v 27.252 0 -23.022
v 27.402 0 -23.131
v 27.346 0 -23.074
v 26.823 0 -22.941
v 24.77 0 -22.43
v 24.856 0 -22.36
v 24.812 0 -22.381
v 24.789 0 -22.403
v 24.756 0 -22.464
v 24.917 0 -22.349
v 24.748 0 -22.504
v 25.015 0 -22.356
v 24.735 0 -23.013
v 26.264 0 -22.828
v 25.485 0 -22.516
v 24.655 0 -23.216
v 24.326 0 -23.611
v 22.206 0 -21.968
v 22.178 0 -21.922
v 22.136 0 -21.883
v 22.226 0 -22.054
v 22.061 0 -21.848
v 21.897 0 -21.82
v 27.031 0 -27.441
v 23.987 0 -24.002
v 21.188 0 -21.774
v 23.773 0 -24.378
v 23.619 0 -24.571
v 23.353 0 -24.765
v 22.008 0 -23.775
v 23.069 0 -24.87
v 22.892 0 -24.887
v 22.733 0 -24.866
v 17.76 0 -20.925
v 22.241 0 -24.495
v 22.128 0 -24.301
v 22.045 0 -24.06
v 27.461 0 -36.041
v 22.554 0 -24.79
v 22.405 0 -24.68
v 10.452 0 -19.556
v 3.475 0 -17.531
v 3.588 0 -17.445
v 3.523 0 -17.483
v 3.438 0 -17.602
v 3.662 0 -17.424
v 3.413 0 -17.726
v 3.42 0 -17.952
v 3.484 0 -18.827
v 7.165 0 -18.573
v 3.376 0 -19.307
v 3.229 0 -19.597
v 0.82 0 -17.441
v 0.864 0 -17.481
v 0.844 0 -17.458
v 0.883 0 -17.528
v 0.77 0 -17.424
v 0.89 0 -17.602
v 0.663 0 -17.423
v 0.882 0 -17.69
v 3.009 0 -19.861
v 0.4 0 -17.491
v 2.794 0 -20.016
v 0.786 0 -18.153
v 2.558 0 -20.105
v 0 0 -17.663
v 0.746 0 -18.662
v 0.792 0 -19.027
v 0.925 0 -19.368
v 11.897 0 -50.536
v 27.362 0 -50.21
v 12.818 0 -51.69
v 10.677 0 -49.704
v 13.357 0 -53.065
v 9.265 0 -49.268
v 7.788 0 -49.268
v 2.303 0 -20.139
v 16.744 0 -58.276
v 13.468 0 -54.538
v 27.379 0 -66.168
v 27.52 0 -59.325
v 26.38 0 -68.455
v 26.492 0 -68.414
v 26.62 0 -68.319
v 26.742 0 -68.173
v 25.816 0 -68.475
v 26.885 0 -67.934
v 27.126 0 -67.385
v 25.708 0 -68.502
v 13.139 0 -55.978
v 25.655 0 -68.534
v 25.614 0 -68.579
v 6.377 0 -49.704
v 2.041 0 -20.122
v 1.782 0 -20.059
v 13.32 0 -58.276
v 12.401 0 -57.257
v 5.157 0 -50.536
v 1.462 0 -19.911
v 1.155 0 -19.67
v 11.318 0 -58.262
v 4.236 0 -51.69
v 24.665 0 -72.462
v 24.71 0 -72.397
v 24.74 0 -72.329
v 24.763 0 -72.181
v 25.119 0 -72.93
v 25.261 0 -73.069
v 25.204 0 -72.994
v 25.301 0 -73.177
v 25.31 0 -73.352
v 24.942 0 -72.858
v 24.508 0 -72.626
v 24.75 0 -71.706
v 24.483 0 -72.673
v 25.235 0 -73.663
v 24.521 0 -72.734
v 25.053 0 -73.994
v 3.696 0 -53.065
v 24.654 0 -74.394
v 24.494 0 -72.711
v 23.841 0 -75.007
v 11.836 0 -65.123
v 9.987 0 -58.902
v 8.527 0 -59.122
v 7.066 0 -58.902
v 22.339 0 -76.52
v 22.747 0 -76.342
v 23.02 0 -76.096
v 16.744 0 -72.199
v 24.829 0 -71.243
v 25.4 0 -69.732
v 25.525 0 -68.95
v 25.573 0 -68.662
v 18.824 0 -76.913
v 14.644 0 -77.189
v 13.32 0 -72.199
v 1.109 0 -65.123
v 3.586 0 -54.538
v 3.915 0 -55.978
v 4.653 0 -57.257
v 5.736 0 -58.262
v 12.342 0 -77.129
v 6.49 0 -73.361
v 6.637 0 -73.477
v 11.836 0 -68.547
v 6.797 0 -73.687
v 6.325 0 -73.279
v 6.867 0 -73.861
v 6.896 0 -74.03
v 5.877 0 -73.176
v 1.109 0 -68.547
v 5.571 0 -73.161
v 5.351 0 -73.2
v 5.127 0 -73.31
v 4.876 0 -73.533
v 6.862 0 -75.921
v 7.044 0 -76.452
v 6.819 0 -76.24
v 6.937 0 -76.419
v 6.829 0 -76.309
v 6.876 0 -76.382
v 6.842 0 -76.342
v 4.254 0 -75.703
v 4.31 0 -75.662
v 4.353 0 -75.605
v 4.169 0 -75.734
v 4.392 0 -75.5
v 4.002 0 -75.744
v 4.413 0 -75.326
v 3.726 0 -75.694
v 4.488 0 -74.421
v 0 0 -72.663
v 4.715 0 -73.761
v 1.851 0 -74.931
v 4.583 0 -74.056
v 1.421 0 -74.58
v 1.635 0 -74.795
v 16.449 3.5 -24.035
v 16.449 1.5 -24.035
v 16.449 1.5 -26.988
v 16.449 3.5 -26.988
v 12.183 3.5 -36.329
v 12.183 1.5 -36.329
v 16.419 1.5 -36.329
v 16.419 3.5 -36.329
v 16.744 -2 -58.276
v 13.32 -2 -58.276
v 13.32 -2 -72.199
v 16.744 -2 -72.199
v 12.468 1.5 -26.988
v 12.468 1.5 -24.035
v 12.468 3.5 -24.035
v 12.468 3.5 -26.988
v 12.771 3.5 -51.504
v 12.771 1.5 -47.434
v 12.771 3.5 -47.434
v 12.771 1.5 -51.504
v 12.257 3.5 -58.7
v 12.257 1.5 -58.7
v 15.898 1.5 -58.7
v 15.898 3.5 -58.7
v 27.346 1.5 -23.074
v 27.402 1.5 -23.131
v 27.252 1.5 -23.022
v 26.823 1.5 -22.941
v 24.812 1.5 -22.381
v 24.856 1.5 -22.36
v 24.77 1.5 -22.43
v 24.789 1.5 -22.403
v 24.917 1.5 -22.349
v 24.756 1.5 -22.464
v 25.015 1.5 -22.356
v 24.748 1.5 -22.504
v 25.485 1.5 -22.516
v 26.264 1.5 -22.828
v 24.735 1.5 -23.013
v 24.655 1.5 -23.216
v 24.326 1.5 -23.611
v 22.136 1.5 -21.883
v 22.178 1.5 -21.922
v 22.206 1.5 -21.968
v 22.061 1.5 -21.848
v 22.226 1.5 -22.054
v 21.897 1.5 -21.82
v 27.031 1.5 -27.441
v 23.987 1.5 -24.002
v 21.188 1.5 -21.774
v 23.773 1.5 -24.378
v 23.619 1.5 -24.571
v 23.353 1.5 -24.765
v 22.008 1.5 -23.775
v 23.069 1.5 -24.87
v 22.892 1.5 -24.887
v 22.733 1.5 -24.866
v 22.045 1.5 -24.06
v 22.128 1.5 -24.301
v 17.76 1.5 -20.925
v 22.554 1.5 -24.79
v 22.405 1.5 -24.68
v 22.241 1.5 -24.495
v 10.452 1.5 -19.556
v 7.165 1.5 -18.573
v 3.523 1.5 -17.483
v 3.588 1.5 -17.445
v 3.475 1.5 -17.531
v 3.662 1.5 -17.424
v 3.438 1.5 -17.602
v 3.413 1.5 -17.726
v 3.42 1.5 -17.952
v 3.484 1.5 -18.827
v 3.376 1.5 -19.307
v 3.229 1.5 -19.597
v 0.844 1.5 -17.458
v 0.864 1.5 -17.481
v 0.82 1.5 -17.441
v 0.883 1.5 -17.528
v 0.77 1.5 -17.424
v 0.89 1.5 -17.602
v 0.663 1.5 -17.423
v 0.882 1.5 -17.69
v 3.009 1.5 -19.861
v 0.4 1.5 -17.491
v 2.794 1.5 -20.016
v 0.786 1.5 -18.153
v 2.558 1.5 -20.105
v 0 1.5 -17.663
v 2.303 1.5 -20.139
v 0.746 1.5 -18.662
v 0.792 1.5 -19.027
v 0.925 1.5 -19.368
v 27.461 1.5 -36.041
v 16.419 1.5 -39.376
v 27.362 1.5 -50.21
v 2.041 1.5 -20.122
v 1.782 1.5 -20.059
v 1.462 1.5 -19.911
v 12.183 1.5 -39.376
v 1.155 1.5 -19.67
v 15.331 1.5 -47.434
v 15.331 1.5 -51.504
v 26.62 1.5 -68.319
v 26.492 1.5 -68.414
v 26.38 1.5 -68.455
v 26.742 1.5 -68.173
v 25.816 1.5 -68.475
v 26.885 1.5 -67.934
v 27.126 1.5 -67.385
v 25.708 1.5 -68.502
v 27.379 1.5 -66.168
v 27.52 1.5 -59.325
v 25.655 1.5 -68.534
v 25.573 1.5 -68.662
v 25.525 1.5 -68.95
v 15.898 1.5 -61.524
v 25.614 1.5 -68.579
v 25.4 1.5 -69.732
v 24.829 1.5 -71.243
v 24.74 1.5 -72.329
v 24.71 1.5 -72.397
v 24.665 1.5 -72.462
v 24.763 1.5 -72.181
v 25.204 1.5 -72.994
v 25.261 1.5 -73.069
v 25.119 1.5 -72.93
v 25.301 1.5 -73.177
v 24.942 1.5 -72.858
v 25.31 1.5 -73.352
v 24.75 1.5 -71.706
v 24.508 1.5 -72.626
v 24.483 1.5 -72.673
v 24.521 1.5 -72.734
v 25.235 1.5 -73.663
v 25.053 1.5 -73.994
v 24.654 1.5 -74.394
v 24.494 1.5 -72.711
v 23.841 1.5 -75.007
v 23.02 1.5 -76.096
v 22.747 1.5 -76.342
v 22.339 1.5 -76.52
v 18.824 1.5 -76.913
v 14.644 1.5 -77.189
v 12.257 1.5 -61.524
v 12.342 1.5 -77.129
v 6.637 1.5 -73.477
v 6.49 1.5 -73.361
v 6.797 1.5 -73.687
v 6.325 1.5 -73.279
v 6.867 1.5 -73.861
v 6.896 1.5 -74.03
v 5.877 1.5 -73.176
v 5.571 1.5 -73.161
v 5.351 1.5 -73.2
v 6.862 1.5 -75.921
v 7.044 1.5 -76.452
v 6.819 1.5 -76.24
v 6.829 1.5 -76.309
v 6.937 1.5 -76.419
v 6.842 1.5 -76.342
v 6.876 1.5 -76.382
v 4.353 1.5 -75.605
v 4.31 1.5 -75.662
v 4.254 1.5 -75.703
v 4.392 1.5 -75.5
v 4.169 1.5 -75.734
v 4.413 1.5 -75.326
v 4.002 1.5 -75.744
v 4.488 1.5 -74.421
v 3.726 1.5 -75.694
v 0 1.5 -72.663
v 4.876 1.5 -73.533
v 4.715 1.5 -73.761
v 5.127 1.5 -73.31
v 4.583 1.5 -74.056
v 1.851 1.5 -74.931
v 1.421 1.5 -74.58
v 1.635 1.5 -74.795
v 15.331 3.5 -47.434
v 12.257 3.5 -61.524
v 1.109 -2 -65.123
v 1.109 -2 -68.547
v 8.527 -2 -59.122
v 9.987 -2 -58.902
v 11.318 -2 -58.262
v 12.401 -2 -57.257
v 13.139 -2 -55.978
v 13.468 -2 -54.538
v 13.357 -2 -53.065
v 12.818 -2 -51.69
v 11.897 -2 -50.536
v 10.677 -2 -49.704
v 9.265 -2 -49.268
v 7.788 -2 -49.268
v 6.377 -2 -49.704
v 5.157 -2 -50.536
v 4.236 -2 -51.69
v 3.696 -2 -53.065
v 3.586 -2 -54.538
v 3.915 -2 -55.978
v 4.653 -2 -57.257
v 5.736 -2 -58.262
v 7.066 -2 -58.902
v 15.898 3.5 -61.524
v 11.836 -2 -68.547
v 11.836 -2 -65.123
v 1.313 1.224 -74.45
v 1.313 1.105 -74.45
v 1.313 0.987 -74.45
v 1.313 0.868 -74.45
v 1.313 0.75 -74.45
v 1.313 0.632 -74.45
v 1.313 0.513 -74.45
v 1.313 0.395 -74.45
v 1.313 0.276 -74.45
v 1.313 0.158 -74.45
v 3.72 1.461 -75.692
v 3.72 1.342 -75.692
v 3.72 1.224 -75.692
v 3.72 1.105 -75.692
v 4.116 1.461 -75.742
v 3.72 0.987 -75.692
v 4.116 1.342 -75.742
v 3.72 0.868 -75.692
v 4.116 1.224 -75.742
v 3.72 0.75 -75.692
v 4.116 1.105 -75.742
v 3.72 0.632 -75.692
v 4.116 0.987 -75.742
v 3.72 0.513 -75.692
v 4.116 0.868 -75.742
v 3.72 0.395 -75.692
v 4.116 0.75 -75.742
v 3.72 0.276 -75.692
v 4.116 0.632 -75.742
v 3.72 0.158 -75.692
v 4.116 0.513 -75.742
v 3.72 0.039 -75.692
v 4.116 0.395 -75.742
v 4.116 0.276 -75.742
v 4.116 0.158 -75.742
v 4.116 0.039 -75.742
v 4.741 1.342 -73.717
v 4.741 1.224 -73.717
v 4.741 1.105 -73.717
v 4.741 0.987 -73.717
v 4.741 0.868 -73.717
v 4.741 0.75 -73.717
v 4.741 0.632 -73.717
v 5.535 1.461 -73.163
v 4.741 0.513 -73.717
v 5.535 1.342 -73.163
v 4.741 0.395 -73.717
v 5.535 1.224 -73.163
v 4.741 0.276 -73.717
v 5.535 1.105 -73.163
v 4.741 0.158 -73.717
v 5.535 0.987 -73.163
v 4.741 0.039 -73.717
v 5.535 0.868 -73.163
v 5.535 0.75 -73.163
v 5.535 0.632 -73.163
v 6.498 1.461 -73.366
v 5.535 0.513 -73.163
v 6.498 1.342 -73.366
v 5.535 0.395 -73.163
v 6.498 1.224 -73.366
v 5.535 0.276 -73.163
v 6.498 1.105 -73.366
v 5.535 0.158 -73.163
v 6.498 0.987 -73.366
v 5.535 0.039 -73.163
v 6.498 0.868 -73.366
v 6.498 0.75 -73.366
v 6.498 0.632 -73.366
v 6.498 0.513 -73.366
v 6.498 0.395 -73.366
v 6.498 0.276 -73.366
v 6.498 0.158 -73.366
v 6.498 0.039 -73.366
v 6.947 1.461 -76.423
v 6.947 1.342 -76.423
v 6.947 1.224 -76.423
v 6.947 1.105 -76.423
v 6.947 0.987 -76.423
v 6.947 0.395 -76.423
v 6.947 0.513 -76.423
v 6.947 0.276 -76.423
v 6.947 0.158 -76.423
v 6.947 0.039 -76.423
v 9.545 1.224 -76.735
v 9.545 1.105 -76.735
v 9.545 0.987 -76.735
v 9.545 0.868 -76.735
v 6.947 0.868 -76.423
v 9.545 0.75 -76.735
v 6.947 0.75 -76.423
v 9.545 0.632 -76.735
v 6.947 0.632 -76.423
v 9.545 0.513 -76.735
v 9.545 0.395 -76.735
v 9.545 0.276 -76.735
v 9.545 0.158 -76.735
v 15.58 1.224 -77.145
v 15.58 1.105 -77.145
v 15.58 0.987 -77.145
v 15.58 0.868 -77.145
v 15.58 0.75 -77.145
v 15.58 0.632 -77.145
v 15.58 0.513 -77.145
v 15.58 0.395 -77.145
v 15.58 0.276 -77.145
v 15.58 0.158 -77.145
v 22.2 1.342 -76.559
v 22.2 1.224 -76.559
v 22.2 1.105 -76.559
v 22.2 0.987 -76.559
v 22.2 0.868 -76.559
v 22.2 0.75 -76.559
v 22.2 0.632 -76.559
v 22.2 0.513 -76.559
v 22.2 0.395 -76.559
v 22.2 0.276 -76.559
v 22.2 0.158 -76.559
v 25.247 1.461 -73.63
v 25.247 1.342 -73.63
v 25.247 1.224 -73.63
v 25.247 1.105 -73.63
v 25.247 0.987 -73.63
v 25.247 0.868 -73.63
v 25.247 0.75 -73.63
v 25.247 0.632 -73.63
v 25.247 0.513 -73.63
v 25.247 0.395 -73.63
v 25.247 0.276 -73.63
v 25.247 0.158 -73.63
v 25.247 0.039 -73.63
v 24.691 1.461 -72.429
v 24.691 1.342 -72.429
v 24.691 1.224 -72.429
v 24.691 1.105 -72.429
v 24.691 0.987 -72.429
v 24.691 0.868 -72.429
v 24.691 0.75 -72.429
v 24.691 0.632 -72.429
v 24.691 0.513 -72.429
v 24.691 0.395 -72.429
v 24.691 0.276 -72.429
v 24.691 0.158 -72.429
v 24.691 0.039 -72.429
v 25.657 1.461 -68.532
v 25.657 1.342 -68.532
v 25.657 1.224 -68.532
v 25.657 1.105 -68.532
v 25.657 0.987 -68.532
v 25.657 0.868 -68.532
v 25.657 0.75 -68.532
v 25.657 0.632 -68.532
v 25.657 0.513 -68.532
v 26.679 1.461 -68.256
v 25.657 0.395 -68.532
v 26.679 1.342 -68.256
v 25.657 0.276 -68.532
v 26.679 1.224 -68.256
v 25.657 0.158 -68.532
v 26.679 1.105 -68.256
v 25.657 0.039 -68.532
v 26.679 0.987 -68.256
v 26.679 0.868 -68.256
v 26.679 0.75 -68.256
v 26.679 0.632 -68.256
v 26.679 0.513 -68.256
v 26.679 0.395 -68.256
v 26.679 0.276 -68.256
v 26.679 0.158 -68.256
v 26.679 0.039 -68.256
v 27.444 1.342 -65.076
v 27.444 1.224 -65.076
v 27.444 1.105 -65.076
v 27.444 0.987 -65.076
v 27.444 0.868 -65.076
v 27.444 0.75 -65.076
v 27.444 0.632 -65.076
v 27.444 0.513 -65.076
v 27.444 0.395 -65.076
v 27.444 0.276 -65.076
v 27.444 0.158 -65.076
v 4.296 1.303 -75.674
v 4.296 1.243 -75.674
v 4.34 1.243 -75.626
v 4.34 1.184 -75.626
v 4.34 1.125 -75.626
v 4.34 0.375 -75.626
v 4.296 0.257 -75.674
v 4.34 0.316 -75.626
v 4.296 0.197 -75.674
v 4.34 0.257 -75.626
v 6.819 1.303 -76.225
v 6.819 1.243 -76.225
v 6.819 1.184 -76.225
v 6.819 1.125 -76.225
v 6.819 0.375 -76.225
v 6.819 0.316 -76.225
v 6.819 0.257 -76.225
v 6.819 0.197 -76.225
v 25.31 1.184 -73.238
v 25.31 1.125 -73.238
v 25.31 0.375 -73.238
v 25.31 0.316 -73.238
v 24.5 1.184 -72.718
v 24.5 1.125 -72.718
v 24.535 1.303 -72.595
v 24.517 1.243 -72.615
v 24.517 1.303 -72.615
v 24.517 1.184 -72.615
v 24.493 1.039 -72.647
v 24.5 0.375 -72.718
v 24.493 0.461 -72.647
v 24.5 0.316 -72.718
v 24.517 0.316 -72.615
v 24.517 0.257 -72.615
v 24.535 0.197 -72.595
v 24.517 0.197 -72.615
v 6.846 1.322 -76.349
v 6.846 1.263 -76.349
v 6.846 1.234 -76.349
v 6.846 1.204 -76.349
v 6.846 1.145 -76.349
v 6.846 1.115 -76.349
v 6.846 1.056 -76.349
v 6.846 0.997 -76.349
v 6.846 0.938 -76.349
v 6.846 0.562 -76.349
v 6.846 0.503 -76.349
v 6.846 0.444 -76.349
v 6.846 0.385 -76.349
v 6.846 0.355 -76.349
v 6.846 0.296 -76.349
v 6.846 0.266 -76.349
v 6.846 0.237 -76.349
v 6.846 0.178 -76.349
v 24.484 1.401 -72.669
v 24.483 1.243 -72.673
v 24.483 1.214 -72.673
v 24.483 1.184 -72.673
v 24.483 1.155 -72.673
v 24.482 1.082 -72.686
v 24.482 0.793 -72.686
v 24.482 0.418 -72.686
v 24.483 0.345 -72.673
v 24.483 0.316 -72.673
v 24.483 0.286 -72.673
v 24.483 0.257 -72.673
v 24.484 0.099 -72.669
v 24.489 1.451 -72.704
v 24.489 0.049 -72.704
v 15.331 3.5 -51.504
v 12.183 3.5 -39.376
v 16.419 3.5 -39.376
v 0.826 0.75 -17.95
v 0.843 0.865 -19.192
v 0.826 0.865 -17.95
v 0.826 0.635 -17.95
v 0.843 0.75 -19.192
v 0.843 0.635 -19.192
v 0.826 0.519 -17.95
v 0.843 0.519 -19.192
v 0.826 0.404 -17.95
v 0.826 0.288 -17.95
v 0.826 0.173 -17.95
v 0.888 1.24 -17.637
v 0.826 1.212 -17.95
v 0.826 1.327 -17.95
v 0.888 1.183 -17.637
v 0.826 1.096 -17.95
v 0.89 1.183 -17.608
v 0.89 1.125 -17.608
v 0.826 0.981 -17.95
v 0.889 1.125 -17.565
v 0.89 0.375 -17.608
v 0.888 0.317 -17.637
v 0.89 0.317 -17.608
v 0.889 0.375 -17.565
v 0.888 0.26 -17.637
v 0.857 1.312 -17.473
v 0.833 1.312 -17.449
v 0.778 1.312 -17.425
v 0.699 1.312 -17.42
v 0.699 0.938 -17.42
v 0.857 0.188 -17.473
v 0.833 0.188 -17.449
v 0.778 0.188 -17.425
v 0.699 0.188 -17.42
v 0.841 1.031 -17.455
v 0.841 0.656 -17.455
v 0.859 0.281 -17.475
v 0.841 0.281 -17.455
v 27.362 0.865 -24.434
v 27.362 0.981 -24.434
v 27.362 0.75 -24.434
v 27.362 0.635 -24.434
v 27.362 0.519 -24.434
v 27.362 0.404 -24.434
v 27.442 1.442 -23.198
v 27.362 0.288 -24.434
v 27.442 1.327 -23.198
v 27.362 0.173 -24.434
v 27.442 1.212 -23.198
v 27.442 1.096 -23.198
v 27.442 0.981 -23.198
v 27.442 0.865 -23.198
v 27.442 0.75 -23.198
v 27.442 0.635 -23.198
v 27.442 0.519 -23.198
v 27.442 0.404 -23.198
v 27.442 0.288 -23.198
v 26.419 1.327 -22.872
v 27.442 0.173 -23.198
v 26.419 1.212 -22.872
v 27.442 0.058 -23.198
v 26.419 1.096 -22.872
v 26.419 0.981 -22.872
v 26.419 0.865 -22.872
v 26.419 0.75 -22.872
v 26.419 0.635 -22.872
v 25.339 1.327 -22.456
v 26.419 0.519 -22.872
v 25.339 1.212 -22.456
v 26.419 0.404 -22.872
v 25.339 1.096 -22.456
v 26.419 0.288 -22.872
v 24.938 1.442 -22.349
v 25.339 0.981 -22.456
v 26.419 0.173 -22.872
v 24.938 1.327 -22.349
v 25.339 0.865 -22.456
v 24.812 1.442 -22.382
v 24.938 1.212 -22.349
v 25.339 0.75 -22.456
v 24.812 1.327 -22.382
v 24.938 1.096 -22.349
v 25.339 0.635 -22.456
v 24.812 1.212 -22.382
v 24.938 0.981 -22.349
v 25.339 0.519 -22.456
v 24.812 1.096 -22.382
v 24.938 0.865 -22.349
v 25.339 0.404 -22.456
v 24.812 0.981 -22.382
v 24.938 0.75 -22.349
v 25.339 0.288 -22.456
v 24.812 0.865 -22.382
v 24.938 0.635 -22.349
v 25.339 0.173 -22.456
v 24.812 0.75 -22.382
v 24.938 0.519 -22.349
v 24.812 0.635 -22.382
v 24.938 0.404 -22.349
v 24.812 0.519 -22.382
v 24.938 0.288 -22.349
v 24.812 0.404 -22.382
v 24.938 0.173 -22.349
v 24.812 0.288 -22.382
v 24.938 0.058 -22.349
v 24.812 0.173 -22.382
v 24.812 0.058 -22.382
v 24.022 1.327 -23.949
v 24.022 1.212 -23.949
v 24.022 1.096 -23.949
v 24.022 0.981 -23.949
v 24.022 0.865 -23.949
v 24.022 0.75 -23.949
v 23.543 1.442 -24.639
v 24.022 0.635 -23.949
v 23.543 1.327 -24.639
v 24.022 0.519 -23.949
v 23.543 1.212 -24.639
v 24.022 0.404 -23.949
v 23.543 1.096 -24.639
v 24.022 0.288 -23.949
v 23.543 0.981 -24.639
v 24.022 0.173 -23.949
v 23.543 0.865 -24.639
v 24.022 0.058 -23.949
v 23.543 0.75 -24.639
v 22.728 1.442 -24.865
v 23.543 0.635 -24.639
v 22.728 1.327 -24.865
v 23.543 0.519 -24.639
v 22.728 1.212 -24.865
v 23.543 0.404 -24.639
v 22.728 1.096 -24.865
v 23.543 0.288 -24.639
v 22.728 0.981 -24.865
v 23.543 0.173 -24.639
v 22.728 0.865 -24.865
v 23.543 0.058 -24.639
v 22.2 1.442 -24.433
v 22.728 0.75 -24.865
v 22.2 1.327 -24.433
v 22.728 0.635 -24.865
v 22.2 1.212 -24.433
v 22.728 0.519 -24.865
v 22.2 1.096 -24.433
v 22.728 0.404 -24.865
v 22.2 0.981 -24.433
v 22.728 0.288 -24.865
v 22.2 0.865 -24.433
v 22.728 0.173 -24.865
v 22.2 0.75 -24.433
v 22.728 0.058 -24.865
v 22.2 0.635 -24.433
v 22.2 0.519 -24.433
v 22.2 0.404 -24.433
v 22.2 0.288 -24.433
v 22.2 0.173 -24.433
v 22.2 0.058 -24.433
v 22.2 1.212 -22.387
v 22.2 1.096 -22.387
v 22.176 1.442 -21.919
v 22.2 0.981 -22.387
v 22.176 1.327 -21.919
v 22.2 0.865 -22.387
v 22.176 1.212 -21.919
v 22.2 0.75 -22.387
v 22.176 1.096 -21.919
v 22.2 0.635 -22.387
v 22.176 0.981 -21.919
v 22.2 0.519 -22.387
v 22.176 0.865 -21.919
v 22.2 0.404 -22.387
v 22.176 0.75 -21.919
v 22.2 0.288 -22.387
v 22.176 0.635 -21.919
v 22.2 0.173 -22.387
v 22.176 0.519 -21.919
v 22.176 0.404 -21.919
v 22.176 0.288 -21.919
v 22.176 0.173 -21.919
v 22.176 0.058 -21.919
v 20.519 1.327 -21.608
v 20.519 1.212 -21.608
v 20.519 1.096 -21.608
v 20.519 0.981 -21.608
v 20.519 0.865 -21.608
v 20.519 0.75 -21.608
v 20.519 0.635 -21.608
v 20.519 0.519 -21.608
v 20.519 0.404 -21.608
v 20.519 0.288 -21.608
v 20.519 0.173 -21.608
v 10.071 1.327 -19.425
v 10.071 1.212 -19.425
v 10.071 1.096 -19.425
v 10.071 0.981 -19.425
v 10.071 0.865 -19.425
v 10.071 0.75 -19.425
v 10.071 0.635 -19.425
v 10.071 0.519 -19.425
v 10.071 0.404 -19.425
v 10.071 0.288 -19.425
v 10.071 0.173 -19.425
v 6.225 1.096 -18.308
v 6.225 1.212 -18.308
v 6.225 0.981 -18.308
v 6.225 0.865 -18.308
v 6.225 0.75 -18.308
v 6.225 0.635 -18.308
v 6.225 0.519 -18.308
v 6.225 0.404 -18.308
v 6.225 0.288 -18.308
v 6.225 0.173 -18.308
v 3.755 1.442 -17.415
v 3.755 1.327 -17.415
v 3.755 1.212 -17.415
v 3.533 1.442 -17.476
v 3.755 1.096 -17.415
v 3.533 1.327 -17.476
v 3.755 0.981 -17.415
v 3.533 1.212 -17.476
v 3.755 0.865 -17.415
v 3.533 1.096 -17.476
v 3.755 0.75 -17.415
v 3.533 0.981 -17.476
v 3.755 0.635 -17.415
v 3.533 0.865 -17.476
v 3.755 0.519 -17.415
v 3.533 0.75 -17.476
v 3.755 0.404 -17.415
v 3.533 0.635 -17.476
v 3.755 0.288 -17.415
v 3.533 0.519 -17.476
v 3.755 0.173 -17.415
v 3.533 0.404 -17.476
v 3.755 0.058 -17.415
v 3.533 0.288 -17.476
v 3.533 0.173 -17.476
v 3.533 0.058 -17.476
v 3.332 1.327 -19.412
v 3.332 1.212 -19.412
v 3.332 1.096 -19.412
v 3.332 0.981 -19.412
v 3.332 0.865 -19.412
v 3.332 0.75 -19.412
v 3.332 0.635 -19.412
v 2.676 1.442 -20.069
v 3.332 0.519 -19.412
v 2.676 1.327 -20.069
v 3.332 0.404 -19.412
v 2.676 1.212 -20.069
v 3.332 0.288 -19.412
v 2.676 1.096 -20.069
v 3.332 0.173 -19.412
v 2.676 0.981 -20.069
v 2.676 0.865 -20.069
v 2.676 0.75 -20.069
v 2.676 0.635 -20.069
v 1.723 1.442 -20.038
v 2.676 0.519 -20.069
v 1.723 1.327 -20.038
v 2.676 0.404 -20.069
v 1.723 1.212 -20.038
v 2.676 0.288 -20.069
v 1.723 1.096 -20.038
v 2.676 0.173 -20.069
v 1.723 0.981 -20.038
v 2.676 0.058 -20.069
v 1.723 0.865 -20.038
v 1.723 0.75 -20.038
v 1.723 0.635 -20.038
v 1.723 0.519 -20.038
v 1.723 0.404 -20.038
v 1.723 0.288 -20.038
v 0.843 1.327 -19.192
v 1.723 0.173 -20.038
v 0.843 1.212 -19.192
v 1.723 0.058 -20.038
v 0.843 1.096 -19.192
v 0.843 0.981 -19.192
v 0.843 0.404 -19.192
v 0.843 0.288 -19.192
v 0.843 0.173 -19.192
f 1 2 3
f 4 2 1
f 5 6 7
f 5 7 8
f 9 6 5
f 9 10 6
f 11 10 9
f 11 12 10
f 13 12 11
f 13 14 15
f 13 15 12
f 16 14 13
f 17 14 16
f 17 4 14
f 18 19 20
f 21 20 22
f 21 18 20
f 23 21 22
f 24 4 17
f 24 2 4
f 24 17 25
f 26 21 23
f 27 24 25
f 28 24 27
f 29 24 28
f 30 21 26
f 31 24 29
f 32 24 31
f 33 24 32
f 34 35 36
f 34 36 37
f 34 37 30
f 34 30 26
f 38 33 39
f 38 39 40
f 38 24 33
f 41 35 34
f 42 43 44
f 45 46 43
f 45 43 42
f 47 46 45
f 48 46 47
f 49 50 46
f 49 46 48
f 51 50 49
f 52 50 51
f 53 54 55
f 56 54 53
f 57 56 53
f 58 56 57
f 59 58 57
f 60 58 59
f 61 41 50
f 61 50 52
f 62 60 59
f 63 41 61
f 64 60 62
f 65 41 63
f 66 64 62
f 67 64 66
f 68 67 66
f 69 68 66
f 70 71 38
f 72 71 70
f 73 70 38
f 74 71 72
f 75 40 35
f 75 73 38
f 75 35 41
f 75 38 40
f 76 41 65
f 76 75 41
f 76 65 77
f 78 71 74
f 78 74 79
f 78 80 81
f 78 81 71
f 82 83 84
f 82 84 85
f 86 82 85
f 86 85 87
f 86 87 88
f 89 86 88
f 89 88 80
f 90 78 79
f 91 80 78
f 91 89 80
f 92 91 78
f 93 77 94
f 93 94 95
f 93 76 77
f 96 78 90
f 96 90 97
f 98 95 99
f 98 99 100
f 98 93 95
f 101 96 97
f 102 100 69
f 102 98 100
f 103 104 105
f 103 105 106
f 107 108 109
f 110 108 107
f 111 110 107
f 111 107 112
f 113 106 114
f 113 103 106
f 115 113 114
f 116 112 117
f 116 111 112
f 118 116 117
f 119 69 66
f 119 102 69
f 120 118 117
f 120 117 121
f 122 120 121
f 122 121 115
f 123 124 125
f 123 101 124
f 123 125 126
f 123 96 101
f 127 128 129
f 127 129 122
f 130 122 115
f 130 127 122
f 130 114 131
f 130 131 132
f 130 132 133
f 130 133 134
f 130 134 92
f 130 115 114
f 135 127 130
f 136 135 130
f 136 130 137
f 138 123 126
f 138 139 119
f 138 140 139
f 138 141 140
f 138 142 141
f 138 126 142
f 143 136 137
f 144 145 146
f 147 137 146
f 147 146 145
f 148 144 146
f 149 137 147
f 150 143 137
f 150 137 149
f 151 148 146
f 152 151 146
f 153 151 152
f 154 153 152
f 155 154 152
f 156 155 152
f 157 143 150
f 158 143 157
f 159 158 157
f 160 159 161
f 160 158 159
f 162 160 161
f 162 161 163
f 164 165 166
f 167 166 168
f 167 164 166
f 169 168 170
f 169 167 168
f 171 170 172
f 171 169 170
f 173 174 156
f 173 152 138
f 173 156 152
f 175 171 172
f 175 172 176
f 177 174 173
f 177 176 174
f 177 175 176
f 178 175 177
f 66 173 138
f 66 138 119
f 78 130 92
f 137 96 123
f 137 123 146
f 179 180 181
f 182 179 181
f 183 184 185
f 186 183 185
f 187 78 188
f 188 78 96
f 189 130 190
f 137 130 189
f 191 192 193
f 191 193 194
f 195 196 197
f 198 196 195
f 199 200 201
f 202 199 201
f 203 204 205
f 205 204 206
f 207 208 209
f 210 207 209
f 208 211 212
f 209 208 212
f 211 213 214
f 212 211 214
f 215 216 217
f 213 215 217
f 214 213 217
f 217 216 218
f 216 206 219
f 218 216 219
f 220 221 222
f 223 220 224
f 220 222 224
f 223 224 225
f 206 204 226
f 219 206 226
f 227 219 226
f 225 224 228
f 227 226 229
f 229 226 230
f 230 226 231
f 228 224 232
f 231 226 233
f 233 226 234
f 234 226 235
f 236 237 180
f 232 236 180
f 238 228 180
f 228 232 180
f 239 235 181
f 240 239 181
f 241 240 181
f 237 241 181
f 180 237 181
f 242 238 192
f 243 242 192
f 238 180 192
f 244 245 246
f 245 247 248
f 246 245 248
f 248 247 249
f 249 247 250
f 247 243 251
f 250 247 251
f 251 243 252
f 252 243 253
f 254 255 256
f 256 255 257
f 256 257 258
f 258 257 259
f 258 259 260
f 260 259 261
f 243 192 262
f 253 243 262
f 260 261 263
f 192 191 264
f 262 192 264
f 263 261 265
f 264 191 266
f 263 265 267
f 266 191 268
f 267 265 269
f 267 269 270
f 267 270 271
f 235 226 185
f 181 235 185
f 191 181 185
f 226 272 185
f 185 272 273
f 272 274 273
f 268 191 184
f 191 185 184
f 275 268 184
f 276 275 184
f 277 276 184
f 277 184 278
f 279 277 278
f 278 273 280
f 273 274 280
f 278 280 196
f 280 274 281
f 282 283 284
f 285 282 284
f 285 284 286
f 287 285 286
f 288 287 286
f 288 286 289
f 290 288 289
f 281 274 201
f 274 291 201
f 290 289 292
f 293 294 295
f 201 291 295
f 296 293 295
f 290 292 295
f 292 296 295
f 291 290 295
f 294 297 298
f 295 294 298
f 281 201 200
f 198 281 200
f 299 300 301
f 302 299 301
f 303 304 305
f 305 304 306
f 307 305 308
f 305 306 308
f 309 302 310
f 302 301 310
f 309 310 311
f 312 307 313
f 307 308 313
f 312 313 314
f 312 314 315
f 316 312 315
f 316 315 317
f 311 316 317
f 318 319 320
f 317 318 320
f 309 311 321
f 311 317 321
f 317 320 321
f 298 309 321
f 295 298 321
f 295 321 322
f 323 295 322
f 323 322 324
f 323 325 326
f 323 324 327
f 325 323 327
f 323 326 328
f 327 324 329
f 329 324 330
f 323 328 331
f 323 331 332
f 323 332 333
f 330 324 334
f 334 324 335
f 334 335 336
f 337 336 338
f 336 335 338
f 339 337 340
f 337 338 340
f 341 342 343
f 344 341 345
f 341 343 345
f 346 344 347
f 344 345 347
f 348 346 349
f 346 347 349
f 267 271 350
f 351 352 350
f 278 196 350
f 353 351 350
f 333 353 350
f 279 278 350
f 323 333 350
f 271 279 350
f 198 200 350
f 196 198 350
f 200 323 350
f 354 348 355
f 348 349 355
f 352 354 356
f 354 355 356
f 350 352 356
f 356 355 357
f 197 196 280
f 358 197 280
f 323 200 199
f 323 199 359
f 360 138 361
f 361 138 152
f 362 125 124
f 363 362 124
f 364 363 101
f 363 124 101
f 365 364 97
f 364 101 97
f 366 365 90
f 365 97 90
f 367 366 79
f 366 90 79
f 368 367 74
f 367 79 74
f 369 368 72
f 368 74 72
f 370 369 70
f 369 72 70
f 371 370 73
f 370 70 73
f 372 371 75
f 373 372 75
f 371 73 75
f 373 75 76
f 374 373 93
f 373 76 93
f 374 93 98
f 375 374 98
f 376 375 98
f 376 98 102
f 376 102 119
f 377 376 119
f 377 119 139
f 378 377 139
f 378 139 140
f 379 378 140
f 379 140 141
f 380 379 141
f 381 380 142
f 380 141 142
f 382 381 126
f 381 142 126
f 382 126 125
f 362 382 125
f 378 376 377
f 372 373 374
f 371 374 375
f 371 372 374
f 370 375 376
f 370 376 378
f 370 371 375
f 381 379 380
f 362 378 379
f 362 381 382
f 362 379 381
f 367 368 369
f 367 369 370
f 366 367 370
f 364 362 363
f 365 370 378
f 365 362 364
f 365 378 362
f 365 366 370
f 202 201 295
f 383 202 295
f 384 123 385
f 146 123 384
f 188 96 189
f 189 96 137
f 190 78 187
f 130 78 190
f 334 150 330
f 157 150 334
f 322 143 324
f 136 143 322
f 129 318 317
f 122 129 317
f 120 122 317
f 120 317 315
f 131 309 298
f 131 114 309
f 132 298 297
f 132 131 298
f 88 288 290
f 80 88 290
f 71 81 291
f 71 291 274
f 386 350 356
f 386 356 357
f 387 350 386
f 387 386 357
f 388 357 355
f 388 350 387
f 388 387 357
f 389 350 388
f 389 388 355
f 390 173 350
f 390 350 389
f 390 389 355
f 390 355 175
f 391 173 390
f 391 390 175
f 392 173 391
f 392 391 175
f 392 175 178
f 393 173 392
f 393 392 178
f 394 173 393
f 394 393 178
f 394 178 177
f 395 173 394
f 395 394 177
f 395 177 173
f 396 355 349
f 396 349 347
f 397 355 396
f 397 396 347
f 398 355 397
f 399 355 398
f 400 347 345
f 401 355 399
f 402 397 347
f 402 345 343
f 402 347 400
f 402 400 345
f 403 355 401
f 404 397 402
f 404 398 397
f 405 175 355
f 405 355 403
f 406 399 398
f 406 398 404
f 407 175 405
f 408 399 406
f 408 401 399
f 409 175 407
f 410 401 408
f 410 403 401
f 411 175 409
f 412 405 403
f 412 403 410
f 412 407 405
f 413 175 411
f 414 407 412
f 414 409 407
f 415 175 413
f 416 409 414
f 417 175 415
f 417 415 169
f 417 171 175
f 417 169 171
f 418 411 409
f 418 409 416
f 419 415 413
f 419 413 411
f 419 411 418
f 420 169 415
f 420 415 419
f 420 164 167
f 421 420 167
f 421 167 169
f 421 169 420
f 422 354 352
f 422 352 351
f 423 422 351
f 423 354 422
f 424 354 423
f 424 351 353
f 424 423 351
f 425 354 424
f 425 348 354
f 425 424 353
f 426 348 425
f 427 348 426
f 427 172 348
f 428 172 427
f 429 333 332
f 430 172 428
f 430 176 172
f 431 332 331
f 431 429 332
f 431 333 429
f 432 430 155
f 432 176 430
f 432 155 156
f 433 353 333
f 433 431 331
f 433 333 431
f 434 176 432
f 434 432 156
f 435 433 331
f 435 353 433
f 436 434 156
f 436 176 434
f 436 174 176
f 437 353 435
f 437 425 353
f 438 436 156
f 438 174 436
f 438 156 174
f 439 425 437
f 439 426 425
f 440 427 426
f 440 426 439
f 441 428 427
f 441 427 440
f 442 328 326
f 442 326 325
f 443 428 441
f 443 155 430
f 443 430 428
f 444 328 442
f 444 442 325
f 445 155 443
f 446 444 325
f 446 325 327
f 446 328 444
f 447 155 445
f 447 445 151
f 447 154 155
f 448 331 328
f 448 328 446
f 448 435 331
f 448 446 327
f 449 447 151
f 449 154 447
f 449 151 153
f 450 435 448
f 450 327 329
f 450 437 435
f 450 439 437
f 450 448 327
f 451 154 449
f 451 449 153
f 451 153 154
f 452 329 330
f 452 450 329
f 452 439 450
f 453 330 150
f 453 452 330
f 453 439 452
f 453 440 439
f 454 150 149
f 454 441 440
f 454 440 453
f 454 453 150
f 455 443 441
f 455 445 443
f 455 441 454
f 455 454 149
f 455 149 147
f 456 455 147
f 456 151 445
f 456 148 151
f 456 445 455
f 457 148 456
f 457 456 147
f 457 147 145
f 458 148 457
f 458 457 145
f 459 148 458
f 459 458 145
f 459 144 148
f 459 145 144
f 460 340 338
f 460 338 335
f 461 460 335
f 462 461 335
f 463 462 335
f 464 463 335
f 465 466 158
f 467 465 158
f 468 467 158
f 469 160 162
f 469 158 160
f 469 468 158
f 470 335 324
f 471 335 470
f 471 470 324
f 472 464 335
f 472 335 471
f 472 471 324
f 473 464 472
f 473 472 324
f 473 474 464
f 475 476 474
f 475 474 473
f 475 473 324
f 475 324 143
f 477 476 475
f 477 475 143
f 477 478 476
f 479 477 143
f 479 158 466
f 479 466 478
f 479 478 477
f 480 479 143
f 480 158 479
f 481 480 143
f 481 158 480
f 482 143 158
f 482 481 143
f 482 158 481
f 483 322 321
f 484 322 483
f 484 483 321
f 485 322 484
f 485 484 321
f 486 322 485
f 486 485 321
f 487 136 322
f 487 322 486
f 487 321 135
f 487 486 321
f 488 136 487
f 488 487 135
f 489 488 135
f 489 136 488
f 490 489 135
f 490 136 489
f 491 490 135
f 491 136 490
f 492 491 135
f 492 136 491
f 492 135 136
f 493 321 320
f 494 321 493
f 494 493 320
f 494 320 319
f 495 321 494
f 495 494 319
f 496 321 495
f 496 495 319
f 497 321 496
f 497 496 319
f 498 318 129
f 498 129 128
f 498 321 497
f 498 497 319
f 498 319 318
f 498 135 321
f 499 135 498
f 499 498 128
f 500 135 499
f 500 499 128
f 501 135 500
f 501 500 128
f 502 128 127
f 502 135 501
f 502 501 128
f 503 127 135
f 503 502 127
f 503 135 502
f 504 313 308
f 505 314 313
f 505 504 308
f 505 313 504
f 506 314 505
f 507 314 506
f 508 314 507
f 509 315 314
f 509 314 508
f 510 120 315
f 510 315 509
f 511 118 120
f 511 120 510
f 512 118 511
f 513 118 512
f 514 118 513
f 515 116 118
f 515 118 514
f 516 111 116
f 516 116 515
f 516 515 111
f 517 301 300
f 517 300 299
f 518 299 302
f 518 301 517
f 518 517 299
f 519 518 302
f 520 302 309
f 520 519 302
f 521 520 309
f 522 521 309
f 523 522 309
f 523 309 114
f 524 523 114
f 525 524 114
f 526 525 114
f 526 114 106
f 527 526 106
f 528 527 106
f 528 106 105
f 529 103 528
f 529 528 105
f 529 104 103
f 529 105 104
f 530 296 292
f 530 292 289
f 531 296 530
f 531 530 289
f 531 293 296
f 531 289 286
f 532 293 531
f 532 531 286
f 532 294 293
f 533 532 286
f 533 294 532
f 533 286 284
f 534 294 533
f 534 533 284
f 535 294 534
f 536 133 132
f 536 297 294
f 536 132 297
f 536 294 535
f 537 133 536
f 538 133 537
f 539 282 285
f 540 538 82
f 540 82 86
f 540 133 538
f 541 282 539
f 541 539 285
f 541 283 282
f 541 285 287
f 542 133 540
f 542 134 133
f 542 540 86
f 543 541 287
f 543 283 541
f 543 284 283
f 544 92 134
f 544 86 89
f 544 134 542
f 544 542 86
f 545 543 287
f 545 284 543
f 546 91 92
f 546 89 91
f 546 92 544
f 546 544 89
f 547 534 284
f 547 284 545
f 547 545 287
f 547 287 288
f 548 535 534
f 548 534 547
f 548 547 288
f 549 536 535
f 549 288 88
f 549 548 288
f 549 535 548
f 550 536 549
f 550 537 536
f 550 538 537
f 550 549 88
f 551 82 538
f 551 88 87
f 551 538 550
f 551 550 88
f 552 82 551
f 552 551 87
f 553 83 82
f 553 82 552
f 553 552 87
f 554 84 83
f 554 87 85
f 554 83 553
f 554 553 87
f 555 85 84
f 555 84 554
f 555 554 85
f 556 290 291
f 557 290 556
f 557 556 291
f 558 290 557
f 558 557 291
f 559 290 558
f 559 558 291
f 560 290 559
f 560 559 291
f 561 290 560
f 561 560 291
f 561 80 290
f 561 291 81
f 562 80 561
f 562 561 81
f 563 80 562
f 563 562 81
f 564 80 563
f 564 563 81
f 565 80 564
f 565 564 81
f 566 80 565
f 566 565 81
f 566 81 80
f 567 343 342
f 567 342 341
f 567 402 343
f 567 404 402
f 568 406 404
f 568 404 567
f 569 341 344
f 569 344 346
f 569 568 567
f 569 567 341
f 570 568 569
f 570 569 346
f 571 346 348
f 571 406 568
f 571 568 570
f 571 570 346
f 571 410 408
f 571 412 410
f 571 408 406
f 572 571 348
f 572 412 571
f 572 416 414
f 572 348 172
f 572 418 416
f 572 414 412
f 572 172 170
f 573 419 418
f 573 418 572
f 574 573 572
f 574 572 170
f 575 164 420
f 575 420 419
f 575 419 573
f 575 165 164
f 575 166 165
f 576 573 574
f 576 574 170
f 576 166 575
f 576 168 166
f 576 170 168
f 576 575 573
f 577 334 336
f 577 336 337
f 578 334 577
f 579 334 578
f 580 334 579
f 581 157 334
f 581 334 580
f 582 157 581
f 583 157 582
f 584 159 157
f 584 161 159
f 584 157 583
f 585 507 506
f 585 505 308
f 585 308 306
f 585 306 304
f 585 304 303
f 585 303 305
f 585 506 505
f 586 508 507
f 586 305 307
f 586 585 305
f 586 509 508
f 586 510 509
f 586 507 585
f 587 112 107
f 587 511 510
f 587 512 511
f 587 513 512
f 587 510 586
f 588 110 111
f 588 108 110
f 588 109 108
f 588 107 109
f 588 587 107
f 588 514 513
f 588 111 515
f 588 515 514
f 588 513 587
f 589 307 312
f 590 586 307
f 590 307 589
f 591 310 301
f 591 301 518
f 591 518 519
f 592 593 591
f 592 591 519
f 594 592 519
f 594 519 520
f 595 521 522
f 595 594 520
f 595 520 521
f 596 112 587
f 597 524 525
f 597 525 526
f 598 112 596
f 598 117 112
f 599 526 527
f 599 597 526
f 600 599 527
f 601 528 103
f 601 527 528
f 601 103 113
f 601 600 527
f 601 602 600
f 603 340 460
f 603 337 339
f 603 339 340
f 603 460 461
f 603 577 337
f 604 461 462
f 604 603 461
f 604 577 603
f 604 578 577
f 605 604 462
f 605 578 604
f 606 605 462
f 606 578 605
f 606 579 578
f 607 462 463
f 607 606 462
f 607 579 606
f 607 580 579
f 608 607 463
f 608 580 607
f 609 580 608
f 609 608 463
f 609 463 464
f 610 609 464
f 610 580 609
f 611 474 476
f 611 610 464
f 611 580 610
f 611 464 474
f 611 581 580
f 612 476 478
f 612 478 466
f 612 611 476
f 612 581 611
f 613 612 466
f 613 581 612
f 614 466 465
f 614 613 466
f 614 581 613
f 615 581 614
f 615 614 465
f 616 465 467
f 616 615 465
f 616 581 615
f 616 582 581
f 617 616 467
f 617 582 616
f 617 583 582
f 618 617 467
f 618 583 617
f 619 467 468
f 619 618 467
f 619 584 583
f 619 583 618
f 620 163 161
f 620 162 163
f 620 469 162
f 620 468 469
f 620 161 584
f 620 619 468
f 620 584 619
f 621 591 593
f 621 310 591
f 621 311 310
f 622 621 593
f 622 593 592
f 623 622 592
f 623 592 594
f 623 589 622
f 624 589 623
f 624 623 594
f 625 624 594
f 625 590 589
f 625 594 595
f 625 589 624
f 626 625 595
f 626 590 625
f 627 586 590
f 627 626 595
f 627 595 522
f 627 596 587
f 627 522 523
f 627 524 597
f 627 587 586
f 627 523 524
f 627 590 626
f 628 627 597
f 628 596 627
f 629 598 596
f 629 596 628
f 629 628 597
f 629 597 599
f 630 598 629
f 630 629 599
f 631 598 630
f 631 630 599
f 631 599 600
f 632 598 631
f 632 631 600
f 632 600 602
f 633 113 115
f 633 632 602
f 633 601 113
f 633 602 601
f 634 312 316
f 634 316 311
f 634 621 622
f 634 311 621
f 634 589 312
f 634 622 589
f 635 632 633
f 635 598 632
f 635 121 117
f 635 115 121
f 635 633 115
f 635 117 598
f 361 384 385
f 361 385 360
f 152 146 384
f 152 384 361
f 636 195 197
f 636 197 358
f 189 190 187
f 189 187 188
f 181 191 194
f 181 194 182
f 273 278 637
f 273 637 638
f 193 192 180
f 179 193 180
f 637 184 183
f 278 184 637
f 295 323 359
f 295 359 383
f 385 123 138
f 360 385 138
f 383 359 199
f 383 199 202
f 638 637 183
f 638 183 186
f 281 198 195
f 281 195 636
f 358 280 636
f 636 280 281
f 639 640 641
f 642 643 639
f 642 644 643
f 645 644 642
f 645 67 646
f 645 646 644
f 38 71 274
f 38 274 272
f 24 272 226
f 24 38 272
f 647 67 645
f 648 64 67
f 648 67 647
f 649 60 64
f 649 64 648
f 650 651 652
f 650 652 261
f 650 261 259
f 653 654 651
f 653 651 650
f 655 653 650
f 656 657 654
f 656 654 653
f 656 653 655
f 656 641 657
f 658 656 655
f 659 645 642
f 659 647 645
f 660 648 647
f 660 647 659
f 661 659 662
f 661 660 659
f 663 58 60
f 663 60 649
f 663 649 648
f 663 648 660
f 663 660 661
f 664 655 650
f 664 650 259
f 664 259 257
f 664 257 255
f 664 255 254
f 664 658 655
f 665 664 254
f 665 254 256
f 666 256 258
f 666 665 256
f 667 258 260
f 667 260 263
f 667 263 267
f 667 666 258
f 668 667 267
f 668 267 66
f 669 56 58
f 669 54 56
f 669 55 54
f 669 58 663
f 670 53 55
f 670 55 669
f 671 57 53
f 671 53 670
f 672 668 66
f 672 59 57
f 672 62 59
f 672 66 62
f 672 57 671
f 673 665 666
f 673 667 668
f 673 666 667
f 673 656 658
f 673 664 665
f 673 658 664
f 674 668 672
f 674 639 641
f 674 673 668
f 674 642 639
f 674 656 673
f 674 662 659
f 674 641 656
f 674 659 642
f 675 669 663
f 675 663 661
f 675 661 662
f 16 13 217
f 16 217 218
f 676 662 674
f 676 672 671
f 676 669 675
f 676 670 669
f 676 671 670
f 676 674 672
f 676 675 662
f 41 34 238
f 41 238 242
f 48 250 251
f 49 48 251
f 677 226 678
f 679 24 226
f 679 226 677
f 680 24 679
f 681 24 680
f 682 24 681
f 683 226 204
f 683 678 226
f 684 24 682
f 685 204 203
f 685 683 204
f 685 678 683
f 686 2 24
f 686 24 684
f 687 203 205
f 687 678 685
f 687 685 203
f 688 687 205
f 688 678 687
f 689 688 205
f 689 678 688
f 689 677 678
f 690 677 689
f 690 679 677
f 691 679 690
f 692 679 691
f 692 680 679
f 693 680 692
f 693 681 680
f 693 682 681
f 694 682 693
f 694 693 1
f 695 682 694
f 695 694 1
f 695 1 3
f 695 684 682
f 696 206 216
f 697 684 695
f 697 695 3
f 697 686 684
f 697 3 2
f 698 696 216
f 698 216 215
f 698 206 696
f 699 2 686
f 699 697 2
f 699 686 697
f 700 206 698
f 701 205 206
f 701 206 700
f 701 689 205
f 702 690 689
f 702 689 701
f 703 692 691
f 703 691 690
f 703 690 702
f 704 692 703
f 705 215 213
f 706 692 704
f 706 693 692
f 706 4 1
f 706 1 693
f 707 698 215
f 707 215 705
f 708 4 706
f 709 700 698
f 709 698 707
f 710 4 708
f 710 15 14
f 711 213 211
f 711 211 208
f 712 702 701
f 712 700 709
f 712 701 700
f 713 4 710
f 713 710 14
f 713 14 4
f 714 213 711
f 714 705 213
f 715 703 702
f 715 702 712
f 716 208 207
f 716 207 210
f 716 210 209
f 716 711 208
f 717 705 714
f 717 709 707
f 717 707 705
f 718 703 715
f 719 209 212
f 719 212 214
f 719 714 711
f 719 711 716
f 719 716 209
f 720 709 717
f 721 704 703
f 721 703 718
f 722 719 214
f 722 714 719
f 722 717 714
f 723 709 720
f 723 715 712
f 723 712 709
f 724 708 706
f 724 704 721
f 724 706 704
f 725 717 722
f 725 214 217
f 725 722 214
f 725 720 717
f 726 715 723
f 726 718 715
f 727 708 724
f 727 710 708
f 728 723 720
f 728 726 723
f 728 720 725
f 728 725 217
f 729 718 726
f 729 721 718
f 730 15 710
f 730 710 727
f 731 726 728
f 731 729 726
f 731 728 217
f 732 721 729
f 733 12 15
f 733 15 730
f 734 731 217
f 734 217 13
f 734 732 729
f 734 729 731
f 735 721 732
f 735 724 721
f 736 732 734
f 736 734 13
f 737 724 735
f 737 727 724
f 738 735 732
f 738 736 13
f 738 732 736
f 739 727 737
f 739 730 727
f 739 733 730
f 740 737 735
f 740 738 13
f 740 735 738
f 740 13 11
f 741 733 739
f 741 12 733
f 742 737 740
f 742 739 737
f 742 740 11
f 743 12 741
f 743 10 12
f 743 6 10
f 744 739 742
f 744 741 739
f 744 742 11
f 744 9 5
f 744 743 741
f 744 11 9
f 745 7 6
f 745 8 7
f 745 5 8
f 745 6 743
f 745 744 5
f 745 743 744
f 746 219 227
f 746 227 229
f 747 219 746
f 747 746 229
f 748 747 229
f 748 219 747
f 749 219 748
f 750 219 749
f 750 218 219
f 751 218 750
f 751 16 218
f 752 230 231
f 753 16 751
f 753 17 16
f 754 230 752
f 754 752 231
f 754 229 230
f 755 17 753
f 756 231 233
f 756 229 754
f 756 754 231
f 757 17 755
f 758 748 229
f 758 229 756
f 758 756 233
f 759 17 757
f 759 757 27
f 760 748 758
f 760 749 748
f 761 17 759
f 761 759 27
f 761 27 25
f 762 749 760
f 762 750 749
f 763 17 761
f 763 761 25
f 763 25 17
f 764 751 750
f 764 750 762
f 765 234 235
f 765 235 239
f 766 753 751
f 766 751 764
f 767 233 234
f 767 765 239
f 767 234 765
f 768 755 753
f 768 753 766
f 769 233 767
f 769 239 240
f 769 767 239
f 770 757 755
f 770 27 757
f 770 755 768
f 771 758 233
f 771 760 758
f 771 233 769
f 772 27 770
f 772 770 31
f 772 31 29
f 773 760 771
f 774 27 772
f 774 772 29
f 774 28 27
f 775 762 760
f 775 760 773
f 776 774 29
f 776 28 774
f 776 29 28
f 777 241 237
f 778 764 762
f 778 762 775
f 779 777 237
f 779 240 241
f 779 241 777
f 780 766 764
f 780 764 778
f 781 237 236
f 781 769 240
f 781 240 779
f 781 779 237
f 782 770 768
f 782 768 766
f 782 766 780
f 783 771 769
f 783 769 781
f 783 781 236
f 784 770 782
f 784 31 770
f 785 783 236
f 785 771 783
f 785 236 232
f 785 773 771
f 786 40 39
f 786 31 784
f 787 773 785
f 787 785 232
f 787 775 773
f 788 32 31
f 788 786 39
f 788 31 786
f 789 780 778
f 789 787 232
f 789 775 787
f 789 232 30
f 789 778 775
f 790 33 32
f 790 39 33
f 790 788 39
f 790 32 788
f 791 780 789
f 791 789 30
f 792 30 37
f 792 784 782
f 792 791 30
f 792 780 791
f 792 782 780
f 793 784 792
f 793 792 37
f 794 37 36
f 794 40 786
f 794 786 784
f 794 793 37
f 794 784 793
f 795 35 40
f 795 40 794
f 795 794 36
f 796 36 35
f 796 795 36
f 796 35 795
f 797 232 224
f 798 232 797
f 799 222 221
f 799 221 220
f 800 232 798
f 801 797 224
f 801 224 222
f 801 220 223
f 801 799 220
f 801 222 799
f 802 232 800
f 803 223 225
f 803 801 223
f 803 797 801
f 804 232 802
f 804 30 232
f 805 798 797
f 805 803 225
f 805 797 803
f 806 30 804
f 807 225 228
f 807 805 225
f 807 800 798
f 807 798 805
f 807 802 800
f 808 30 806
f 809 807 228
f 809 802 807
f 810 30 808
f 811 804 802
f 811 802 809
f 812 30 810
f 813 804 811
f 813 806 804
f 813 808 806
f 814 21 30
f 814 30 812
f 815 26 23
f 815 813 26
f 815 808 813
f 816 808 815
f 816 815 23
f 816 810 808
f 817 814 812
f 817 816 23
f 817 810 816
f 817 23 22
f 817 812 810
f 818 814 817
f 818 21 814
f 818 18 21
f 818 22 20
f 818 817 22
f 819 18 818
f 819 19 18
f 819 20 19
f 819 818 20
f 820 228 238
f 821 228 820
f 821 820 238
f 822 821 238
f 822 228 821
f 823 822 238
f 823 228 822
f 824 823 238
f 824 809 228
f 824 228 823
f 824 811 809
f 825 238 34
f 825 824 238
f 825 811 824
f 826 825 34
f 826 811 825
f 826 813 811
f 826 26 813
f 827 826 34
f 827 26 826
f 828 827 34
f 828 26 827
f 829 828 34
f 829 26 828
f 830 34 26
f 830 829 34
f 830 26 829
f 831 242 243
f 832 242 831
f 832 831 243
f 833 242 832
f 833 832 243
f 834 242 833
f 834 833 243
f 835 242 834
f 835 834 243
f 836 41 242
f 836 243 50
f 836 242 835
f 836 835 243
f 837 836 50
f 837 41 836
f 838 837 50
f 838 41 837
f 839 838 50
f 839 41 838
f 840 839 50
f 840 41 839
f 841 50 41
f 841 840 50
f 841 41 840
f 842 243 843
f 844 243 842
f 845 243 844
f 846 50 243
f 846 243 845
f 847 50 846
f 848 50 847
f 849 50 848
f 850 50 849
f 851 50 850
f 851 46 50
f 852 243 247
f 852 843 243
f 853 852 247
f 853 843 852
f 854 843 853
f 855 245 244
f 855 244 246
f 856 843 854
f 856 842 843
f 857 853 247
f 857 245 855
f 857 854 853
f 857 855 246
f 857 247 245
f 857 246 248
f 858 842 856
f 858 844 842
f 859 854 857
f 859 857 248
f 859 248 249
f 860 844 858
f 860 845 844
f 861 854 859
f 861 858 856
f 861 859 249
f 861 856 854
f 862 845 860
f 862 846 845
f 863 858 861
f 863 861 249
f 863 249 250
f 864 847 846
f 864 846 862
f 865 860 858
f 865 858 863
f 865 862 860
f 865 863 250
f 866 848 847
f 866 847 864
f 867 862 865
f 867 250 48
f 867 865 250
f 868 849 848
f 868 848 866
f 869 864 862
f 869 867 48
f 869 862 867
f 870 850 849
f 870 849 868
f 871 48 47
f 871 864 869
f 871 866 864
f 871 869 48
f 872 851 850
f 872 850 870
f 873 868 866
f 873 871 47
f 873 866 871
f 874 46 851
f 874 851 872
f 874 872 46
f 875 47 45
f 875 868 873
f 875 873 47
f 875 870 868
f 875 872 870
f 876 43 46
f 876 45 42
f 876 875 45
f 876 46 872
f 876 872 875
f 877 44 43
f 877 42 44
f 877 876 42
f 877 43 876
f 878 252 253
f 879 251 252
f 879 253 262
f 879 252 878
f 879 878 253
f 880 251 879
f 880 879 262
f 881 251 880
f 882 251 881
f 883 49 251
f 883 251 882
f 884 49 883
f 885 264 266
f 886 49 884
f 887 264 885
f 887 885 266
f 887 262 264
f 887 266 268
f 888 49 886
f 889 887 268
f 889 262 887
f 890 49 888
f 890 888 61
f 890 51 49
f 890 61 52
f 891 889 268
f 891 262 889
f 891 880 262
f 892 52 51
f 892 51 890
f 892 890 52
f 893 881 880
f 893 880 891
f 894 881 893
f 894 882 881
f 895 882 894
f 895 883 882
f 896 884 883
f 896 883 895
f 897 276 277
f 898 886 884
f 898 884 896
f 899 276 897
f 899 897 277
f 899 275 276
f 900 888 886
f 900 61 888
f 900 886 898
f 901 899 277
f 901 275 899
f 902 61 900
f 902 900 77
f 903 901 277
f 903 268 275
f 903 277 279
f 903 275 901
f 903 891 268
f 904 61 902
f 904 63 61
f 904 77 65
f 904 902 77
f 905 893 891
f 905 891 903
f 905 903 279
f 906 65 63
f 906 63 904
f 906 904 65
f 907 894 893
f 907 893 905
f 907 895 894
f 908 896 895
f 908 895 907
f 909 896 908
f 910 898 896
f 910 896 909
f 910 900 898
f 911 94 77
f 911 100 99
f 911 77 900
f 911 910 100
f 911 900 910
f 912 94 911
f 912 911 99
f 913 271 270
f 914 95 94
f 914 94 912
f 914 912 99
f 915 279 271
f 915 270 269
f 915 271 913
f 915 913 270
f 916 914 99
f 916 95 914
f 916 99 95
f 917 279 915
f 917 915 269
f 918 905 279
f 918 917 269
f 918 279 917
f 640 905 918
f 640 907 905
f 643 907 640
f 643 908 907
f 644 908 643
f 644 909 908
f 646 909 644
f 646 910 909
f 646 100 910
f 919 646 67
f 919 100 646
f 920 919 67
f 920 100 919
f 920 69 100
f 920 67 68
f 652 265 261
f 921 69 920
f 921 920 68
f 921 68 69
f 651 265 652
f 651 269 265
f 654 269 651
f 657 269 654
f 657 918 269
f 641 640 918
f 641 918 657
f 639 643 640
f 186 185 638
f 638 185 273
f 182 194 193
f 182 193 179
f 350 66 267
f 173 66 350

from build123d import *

# Parameters (mm, degrees)
EXTRUDE_1_DEPTH = 1.5
SKETCH_2_W      = 3.641360828
SKETCH_2_H      = 2.823912479
SKETCH_2_W_2    = 2.560260108
SKETCH_2_H_2    = 4.070365954
SKETCH_2_W_3    = 4.235868718
SKETCH_2_H_3    = 3.046852937
SKETCH_2_W_4    = 3.980824833
SKETCH_2_H_4    = 2.953515199
EXTRUDE_2_DEPTH = 2
SKETCH_3_R      = 4.954752346
SKETCH_3_W      = 10.727391442
SKETCH_3_H      = 3.423635567
SKETCH_3_W_2    = 3.423635567
SKETCH_3_H_2    = 13.922784638
EXTRUDE_3_DEPTH = 2


with BuildPart() as part:
    # 草图1 → 凸台-拉伸1 (new body)
    with BuildSketch(Plane(origin=(0, 0, 0), x_dir=(1, 0, 0), z_dir=(0, 1, 0))):
        with BuildLine():
            Line((0, 17.662865505), (0, 72.662865505))
            add(Edge.make_bspline(
                [(0, 72.662865505), (0.359994338, 73.317840741), (0.961790835, 74.013712658), (1.651769448, 74.865970817), (2.2237125, 75.078394076), (2.963796752, 75.385508549), (4.447892556, 76.095370782), (4.404920424, 75.020607647), (4.470972621, 74.414798052), (4.668868176, 73.678159547), (5.28307957, 73.113571144), (5.965522322, 73.174926274), (6.52743516, 73.30902678), (6.958590181, 73.839871323), (6.846769074, 74.620864446), (6.88369291, 75.362906626), (6.879169739, 75.929624199), (6.761352631, 76.400426411), (7.34342991, 76.510080151), (8.170824777, 76.631944856), (9.926067545, 76.722931376), (12.415303356, 77.252469909), (15.561754789, 77.192413629), (18.880688136, 76.852349303), (21.283671306, 76.855338978), (23.078936939, 76.29196178), (23.623214072, 74.763426633), (25.225191797, 74.31799166), (25.400306471, 72.79166722), (24.224528566, 72.801354171), (24.81763691, 72.387567236), (24.648550622, 71.563119879), (25.116725802, 70.462671395), (25.542685225, 69.482122183), (25.520423138, 68.308543736), (26.44415621, 68.613158726), (27.358373207, 67.30903347), (27.465803045, 64.557619954), (27.677449576, 58.62456891), (27.144942804, 53.652510599), (27.362010621, 50.210209417)],
                knots=[0, 0, 0, 0, 0.038765253, 0.048891498, 0.056214385, 0.069512153, 0.097007191, 0.106269992, 0.116550062, 0.130621982, 0.145160196, 0.155389249, 0.16509338, 0.174918064, 0.187714604, 0.20459254, 0.213302264, 0.219439696, 0.224948209, 0.238908149, 0.267154043, 0.314168752, 0.372988026, 0.430416663, 0.489044393, 0.498922184, 0.525840339, 0.56381548, 0.575678535, 0.588505701, 0.593942517, 0.602697176, 0.629615331, 0.653080919, 0.664121664, 0.67750766, 0.687633905, 0.740395392, 0.819448255, 1, 1, 1, 1], degree=3))
            add(Edge.make_bspline(
                [(27.362010621, 50.210209417), (27.187485216, 44.627176414), (27.966035151, 34.897021733), (26.683035445, 27.305447808), (27.695649126, 22.881168036), (26.187229842, 23.042925819), (24.601165607, 21.912960837), (24.85897088, 23.281126598), (24.039352108, 23.726410022), (23.716808759, 24.6475316), (22.794066332, 25.080179717), (21.758444387, 24.085790322), (22.122672509, 23.021923082), (22.290109674, 21.743482837), (21.467331231, 21.881840034), (18.340812215, 20.969829219), (15.485923515, 20.50240584), (11.07268025, 19.931645067), (8.250046685, 18.646585046), (6.319905319, 18.630002489), (3.125608368, 16.717439113), (3.54342278, 18.550258459), (3.436444353, 19.375453599), (2.793221384, 20.19086256), (1.654198332, 20.163010596), (0.67331743, 19.296393441), (0.745216148, 17.991314038), (1.068786026, 17.150537029), (0, 17.662865505)],
                knots=[0, 0, 0, 0, 0.284862499, 0.411162803, 0.432641934, 0.448072643, 0.475377821, 0.482251143, 0.502279339, 0.512331371, 0.528882737, 0.539744887, 0.572393166, 0.579266488, 0.591998026, 0.603783111, 0.697117333, 0.775565699, 0.802816917, 0.839091763, 0.884645069, 0.897259758, 0.912555473, 0.925130102, 0.942298667, 0.960054774, 0.981327496, 1, 1, 1, 1], degree=3))
        make_face()
    extrude(amount=EXTRUDE_1_DEPTH)

    # 草图2 → 凸台-拉伸2 (add)
    with BuildSketch(Plane(origin=(0, 1.5, 0), x_dir=(1, 0, 0), z_dir=(0, 1, 0))):
        with Locations((14.077214113, 60.111951137)):
            Rectangle(SKETCH_2_W, SKETCH_2_H)
        with Locations((14.05064076, 49.468781143)):
            Rectangle(SKETCH_2_W_2, SKETCH_2_H_2)
        with Locations((14.301042771, 37.852692672)):
            Rectangle(SKETCH_2_W_3, SKETCH_2_H_3)
        with Locations((14.45824736, 25.51129467)):
            Rectangle(SKETCH_2_W_4, SKETCH_2_H_4)
    extrude(amount=EXTRUDE_2_DEPTH)

    # 草图3 → 凸台-拉伸3 (add)
    with BuildSketch(Plane(origin=(0, 0, 0), x_dir=(-1, 0, 0), z_dir=(0, -1, 0))):
        with Locations(Location((-8.526857342, 54.167726659, 0), (0, 0, 90))):
            Circle(SKETCH_3_R)
        with Locations((-6.472676002, 66.835178256)):
            Rectangle(SKETCH_3_W, SKETCH_3_H)
        with Locations((-15.031764919, 65.237481658)):
            Rectangle(SKETCH_3_W_2, SKETCH_3_H_2)
    extrude(amount=EXTRUDE_3_DEPTH)


solid = part.part
